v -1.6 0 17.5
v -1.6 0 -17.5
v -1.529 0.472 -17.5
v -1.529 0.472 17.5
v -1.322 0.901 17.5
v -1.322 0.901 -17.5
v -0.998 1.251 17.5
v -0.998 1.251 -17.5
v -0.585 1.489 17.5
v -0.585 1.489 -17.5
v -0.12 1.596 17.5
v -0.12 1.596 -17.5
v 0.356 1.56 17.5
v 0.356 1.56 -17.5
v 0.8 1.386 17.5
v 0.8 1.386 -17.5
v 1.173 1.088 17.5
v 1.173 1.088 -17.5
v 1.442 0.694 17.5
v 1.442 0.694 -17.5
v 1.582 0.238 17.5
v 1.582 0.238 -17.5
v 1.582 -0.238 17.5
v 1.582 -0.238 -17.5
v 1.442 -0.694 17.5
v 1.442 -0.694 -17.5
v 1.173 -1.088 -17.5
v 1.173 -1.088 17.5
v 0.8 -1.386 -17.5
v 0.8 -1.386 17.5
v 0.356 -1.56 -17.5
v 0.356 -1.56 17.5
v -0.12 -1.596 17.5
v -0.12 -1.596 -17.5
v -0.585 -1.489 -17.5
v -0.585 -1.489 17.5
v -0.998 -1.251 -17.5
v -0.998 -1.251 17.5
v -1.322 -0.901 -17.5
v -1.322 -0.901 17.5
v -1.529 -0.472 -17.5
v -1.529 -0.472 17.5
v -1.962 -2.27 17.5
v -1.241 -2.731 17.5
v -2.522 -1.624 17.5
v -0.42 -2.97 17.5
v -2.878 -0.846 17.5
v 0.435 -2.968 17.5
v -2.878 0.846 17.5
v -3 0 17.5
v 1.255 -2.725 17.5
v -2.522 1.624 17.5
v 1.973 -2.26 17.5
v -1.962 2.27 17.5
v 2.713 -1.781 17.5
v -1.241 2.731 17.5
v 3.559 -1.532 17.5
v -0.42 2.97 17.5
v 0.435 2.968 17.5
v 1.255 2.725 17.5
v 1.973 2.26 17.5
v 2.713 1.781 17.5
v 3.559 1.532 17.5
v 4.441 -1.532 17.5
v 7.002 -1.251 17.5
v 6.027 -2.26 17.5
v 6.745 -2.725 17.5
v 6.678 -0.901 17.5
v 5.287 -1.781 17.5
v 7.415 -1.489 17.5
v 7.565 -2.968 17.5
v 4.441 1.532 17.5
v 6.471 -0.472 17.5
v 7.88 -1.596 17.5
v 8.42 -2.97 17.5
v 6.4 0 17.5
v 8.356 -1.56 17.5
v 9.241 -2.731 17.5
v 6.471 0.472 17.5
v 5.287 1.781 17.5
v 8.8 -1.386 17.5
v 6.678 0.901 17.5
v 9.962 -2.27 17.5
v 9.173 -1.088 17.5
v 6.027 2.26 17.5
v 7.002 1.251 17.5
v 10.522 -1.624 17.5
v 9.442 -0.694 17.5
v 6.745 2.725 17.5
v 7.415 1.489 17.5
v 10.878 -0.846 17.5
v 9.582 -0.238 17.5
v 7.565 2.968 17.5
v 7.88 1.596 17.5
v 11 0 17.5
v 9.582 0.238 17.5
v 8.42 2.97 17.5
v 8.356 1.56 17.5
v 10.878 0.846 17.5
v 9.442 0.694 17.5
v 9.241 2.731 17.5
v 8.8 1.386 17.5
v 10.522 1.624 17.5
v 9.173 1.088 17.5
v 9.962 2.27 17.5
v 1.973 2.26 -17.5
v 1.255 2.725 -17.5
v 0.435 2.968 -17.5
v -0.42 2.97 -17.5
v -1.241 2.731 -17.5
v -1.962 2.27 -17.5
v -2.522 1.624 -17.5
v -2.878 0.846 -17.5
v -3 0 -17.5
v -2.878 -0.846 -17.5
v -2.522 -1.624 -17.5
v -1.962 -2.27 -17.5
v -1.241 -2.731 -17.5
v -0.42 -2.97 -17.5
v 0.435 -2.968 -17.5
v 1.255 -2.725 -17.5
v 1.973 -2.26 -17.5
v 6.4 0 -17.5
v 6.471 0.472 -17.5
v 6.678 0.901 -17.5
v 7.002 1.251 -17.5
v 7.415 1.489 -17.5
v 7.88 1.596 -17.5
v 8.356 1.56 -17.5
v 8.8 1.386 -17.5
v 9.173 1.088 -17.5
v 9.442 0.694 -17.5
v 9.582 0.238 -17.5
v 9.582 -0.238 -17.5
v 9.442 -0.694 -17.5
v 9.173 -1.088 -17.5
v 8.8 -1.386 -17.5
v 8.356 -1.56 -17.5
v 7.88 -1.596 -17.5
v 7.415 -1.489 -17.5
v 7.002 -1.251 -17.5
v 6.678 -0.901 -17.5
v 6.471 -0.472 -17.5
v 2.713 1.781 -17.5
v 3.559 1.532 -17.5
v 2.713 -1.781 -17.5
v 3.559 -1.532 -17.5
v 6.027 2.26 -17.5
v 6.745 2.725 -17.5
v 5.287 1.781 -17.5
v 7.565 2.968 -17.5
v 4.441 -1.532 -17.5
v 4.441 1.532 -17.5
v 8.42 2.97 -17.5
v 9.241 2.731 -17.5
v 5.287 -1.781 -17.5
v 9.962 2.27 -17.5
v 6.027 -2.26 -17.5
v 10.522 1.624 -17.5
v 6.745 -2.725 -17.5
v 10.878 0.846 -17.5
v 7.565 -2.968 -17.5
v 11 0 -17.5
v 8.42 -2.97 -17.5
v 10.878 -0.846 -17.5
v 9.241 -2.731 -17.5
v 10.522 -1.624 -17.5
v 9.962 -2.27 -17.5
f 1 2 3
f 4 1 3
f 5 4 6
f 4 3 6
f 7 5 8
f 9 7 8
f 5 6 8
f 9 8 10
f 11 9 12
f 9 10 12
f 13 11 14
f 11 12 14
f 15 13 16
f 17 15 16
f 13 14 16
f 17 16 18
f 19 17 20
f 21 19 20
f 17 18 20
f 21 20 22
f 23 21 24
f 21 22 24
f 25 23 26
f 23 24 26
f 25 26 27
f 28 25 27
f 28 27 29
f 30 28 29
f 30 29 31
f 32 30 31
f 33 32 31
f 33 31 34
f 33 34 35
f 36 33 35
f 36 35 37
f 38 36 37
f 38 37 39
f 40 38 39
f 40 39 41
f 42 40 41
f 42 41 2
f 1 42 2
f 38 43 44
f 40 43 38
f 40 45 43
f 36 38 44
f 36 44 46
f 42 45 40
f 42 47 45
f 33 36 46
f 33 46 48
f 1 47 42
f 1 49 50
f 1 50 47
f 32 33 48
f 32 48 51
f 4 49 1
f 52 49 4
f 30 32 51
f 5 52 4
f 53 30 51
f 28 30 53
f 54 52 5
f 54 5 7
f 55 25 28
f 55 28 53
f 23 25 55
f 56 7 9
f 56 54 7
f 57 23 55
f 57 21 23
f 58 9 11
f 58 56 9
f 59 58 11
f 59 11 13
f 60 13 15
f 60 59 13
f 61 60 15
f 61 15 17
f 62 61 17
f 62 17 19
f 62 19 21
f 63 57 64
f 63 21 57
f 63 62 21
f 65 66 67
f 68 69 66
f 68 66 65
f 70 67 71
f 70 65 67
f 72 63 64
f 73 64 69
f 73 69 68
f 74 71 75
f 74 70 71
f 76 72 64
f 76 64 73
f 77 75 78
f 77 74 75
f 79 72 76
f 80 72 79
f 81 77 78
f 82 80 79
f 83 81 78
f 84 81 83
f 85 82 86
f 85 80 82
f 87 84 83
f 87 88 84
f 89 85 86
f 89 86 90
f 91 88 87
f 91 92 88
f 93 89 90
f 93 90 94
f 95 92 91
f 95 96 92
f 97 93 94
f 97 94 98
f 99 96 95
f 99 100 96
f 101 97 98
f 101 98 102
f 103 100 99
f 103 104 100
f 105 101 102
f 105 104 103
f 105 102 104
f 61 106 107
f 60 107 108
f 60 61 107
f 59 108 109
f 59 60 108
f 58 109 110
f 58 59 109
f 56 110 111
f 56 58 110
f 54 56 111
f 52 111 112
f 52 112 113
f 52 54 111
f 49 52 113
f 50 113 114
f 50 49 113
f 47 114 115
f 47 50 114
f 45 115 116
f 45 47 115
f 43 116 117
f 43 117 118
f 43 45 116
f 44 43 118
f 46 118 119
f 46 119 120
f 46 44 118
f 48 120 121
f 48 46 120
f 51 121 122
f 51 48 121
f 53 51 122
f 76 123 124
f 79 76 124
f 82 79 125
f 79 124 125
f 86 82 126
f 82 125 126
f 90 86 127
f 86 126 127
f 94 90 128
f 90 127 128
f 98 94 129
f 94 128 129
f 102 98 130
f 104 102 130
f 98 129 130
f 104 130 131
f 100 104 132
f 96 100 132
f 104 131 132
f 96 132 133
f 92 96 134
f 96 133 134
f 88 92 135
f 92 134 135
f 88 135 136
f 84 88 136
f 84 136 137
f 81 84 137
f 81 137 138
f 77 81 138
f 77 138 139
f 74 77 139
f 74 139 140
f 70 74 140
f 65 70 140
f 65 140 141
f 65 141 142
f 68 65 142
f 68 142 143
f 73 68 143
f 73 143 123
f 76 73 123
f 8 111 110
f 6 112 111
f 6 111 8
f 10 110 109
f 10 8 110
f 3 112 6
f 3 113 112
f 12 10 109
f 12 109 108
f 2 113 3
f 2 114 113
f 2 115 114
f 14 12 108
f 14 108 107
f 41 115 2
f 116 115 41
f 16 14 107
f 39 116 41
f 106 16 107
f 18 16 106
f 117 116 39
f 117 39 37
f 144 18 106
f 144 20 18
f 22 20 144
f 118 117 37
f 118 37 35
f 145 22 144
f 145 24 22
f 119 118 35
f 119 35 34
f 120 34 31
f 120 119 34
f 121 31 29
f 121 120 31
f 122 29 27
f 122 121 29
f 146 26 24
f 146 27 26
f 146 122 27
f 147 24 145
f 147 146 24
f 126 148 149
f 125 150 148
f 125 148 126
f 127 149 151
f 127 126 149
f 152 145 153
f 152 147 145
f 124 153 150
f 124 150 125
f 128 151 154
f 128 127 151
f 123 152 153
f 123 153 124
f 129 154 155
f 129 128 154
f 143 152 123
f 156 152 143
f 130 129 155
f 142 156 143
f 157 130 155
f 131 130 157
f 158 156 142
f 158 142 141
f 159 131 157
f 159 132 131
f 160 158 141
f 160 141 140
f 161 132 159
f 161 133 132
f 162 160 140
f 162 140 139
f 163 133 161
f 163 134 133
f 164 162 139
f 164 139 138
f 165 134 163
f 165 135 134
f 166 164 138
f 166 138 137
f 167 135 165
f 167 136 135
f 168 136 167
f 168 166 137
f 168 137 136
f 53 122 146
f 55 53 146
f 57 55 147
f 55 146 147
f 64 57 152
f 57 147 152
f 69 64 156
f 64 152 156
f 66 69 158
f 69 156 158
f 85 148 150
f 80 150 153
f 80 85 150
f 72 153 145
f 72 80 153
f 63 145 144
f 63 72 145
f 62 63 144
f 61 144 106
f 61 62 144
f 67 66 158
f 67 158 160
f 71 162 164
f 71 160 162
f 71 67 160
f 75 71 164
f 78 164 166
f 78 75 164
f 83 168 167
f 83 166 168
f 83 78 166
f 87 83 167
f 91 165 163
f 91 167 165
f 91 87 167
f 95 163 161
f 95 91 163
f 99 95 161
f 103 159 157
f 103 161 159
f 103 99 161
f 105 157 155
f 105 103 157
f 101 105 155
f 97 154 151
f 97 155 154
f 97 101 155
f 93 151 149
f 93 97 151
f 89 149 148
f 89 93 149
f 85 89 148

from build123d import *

# Parameters (mm, degrees)
SKETCH1_R                       = 3
BOSS_EXTRUDE1_DEPTH             = 17.5
M3_CLEARANCE_HOLE_D             = 3.2
BOSS_EXTRUDE2_REACH             = 19.5
SKETCH2_R                       = 3
BOSS_EXTRUDE2_DIRECTION_2_REACH = 19.5
M3_CLEARANCE_HOLE2_D            = 3.2


with BuildPart() as part:
    # Sketch1 → Boss-Extrude1 (new body, symmetric)
    with BuildSketch(Plane.XY):
        Circle(SKETCH1_R)
    extrude(amount=BOSS_EXTRUDE1_DEPTH, both=True)

    # M3 Clearance Hole (through all)
    with Locations(Plane.XY.offset(17.5)):
        with Locations((0, 0)):
            Hole(M3_CLEARANCE_HOLE_D / 2)

    # Boss-Extrude2: up to this face of the body (flat: up to its plane)
    boss_extrude2_end = Plane(part.part.faces().sort_by_distance((-2.915147186, 0, 17.5))[0])
    # Sketch2 → Boss-Extrude2 (add, up to the picked face)
    with BuildSketch(Plane.XY, mode=Mode.PRIVATE) as boss_extrude2_sk1:
        with Locations((8, 0)):
            Circle(SKETCH2_R)
    boss_extrude2_tool1 = split(extrude(boss_extrude2_sk1.sketch, amount=BOSS_EXTRUDE2_REACH, mode=Mode.PRIVATE), bisect_by=boss_extrude2_end, keep=Keep.BOTH, mode=Mode.PRIVATE)
    add(boss_extrude2_tool1.solids().sort_by_distance((8, 0, 0))[0])
    # Sketch2 → Boss-Extrude2 (add, up to the picked face)
    with BuildSketch(Plane.XY, mode=Mode.PRIVATE) as boss_extrude2_sk2:
        with BuildLine():
            ThreePointArc((6.02739726, -2.260273973), (5, 0), (6.02739726, 2.260273973))
            ThreePointArc((6.02739726, 2.260273973), (4, 1.5), (1.97260274, 2.260273973))
            ThreePointArc((1.97260274, 2.260273973), (2.731099432, 1.241408833), (3, 0))
            ThreePointArc((3, 0), (2.731099432, -1.241408833), (1.97260274, -2.260273973))
            ThreePointArc((1.97260274, -2.260273973), (4, -1.5), (6.02739726, -2.260273973))
        make_face()
    boss_extrude2_tool2 = split(extrude(boss_extrude2_sk2.sketch, amount=BOSS_EXTRUDE2_REACH, mode=Mode.PRIVATE), bisect_by=boss_extrude2_end, keep=Keep.BOTH, mode=Mode.PRIVATE)
    add(boss_extrude2_tool2.solids().sort_by_distance((4, 0, 0))[0])

    # Boss-Extrude2 direction 2: up to this face of the body (flat: up to its plane)
    boss_extrude2_direction_2_end = Plane(part.part.faces().sort_by_distance((-2.915147186, 0, -17.5))[0])
    # Sketch2 → Boss-Extrude2 direction 2 (add, up to the picked face)
    with BuildSketch(Plane.XY, mode=Mode.PRIVATE) as boss_extrude2_direction_2_sk1:
        with Locations((8, 0)):
            Circle(SKETCH2_R)
    boss_extrude2_direction_2_tool1 = split(extrude(boss_extrude2_direction_2_sk1.sketch, amount=-BOSS_EXTRUDE2_DIRECTION_2_REACH, mode=Mode.PRIVATE), bisect_by=boss_extrude2_direction_2_end, keep=Keep.BOTH, mode=Mode.PRIVATE)
    add(boss_extrude2_direction_2_tool1.solids().sort_by_distance((8, 0, 0))[0])
    # Sketch2 → Boss-Extrude2 direction 2 (add, up to the picked face)
    with BuildSketch(Plane.XY, mode=Mode.PRIVATE) as boss_extrude2_direction_2_sk2:
        with BuildLine():
            ThreePointArc((6.02739726, -2.260273973), (5, 0), (6.02739726, 2.260273973))
            ThreePointArc((6.02739726, 2.260273973), (4, 1.5), (1.97260274, 2.260273973))
            ThreePointArc((1.97260274, 2.260273973), (2.731099432, 1.241408833), (3, 0))
            ThreePointArc((3, 0), (2.731099432, -1.241408833), (1.97260274, -2.260273973))
            ThreePointArc((1.97260274, -2.260273973), (4, -1.5), (6.02739726, -2.260273973))
        make_face()
    boss_extrude2_direction_2_tool2 = split(extrude(boss_extrude2_direction_2_sk2.sketch, amount=-BOSS_EXTRUDE2_DIRECTION_2_REACH, mode=Mode.PRIVATE), bisect_by=boss_extrude2_direction_2_end, keep=Keep.BOTH, mode=Mode.PRIVATE)
    add(boss_extrude2_direction_2_tool2.solids().sort_by_distance((4, 0, 0))[0])

    # M3 Clearance Hole2 (through all)
    with Locations(Plane.XY.offset(17.5)):
        with Locations((8, 0)):
            Hole(M3_CLEARANCE_HOLE2_D / 2)


solid = part.part
